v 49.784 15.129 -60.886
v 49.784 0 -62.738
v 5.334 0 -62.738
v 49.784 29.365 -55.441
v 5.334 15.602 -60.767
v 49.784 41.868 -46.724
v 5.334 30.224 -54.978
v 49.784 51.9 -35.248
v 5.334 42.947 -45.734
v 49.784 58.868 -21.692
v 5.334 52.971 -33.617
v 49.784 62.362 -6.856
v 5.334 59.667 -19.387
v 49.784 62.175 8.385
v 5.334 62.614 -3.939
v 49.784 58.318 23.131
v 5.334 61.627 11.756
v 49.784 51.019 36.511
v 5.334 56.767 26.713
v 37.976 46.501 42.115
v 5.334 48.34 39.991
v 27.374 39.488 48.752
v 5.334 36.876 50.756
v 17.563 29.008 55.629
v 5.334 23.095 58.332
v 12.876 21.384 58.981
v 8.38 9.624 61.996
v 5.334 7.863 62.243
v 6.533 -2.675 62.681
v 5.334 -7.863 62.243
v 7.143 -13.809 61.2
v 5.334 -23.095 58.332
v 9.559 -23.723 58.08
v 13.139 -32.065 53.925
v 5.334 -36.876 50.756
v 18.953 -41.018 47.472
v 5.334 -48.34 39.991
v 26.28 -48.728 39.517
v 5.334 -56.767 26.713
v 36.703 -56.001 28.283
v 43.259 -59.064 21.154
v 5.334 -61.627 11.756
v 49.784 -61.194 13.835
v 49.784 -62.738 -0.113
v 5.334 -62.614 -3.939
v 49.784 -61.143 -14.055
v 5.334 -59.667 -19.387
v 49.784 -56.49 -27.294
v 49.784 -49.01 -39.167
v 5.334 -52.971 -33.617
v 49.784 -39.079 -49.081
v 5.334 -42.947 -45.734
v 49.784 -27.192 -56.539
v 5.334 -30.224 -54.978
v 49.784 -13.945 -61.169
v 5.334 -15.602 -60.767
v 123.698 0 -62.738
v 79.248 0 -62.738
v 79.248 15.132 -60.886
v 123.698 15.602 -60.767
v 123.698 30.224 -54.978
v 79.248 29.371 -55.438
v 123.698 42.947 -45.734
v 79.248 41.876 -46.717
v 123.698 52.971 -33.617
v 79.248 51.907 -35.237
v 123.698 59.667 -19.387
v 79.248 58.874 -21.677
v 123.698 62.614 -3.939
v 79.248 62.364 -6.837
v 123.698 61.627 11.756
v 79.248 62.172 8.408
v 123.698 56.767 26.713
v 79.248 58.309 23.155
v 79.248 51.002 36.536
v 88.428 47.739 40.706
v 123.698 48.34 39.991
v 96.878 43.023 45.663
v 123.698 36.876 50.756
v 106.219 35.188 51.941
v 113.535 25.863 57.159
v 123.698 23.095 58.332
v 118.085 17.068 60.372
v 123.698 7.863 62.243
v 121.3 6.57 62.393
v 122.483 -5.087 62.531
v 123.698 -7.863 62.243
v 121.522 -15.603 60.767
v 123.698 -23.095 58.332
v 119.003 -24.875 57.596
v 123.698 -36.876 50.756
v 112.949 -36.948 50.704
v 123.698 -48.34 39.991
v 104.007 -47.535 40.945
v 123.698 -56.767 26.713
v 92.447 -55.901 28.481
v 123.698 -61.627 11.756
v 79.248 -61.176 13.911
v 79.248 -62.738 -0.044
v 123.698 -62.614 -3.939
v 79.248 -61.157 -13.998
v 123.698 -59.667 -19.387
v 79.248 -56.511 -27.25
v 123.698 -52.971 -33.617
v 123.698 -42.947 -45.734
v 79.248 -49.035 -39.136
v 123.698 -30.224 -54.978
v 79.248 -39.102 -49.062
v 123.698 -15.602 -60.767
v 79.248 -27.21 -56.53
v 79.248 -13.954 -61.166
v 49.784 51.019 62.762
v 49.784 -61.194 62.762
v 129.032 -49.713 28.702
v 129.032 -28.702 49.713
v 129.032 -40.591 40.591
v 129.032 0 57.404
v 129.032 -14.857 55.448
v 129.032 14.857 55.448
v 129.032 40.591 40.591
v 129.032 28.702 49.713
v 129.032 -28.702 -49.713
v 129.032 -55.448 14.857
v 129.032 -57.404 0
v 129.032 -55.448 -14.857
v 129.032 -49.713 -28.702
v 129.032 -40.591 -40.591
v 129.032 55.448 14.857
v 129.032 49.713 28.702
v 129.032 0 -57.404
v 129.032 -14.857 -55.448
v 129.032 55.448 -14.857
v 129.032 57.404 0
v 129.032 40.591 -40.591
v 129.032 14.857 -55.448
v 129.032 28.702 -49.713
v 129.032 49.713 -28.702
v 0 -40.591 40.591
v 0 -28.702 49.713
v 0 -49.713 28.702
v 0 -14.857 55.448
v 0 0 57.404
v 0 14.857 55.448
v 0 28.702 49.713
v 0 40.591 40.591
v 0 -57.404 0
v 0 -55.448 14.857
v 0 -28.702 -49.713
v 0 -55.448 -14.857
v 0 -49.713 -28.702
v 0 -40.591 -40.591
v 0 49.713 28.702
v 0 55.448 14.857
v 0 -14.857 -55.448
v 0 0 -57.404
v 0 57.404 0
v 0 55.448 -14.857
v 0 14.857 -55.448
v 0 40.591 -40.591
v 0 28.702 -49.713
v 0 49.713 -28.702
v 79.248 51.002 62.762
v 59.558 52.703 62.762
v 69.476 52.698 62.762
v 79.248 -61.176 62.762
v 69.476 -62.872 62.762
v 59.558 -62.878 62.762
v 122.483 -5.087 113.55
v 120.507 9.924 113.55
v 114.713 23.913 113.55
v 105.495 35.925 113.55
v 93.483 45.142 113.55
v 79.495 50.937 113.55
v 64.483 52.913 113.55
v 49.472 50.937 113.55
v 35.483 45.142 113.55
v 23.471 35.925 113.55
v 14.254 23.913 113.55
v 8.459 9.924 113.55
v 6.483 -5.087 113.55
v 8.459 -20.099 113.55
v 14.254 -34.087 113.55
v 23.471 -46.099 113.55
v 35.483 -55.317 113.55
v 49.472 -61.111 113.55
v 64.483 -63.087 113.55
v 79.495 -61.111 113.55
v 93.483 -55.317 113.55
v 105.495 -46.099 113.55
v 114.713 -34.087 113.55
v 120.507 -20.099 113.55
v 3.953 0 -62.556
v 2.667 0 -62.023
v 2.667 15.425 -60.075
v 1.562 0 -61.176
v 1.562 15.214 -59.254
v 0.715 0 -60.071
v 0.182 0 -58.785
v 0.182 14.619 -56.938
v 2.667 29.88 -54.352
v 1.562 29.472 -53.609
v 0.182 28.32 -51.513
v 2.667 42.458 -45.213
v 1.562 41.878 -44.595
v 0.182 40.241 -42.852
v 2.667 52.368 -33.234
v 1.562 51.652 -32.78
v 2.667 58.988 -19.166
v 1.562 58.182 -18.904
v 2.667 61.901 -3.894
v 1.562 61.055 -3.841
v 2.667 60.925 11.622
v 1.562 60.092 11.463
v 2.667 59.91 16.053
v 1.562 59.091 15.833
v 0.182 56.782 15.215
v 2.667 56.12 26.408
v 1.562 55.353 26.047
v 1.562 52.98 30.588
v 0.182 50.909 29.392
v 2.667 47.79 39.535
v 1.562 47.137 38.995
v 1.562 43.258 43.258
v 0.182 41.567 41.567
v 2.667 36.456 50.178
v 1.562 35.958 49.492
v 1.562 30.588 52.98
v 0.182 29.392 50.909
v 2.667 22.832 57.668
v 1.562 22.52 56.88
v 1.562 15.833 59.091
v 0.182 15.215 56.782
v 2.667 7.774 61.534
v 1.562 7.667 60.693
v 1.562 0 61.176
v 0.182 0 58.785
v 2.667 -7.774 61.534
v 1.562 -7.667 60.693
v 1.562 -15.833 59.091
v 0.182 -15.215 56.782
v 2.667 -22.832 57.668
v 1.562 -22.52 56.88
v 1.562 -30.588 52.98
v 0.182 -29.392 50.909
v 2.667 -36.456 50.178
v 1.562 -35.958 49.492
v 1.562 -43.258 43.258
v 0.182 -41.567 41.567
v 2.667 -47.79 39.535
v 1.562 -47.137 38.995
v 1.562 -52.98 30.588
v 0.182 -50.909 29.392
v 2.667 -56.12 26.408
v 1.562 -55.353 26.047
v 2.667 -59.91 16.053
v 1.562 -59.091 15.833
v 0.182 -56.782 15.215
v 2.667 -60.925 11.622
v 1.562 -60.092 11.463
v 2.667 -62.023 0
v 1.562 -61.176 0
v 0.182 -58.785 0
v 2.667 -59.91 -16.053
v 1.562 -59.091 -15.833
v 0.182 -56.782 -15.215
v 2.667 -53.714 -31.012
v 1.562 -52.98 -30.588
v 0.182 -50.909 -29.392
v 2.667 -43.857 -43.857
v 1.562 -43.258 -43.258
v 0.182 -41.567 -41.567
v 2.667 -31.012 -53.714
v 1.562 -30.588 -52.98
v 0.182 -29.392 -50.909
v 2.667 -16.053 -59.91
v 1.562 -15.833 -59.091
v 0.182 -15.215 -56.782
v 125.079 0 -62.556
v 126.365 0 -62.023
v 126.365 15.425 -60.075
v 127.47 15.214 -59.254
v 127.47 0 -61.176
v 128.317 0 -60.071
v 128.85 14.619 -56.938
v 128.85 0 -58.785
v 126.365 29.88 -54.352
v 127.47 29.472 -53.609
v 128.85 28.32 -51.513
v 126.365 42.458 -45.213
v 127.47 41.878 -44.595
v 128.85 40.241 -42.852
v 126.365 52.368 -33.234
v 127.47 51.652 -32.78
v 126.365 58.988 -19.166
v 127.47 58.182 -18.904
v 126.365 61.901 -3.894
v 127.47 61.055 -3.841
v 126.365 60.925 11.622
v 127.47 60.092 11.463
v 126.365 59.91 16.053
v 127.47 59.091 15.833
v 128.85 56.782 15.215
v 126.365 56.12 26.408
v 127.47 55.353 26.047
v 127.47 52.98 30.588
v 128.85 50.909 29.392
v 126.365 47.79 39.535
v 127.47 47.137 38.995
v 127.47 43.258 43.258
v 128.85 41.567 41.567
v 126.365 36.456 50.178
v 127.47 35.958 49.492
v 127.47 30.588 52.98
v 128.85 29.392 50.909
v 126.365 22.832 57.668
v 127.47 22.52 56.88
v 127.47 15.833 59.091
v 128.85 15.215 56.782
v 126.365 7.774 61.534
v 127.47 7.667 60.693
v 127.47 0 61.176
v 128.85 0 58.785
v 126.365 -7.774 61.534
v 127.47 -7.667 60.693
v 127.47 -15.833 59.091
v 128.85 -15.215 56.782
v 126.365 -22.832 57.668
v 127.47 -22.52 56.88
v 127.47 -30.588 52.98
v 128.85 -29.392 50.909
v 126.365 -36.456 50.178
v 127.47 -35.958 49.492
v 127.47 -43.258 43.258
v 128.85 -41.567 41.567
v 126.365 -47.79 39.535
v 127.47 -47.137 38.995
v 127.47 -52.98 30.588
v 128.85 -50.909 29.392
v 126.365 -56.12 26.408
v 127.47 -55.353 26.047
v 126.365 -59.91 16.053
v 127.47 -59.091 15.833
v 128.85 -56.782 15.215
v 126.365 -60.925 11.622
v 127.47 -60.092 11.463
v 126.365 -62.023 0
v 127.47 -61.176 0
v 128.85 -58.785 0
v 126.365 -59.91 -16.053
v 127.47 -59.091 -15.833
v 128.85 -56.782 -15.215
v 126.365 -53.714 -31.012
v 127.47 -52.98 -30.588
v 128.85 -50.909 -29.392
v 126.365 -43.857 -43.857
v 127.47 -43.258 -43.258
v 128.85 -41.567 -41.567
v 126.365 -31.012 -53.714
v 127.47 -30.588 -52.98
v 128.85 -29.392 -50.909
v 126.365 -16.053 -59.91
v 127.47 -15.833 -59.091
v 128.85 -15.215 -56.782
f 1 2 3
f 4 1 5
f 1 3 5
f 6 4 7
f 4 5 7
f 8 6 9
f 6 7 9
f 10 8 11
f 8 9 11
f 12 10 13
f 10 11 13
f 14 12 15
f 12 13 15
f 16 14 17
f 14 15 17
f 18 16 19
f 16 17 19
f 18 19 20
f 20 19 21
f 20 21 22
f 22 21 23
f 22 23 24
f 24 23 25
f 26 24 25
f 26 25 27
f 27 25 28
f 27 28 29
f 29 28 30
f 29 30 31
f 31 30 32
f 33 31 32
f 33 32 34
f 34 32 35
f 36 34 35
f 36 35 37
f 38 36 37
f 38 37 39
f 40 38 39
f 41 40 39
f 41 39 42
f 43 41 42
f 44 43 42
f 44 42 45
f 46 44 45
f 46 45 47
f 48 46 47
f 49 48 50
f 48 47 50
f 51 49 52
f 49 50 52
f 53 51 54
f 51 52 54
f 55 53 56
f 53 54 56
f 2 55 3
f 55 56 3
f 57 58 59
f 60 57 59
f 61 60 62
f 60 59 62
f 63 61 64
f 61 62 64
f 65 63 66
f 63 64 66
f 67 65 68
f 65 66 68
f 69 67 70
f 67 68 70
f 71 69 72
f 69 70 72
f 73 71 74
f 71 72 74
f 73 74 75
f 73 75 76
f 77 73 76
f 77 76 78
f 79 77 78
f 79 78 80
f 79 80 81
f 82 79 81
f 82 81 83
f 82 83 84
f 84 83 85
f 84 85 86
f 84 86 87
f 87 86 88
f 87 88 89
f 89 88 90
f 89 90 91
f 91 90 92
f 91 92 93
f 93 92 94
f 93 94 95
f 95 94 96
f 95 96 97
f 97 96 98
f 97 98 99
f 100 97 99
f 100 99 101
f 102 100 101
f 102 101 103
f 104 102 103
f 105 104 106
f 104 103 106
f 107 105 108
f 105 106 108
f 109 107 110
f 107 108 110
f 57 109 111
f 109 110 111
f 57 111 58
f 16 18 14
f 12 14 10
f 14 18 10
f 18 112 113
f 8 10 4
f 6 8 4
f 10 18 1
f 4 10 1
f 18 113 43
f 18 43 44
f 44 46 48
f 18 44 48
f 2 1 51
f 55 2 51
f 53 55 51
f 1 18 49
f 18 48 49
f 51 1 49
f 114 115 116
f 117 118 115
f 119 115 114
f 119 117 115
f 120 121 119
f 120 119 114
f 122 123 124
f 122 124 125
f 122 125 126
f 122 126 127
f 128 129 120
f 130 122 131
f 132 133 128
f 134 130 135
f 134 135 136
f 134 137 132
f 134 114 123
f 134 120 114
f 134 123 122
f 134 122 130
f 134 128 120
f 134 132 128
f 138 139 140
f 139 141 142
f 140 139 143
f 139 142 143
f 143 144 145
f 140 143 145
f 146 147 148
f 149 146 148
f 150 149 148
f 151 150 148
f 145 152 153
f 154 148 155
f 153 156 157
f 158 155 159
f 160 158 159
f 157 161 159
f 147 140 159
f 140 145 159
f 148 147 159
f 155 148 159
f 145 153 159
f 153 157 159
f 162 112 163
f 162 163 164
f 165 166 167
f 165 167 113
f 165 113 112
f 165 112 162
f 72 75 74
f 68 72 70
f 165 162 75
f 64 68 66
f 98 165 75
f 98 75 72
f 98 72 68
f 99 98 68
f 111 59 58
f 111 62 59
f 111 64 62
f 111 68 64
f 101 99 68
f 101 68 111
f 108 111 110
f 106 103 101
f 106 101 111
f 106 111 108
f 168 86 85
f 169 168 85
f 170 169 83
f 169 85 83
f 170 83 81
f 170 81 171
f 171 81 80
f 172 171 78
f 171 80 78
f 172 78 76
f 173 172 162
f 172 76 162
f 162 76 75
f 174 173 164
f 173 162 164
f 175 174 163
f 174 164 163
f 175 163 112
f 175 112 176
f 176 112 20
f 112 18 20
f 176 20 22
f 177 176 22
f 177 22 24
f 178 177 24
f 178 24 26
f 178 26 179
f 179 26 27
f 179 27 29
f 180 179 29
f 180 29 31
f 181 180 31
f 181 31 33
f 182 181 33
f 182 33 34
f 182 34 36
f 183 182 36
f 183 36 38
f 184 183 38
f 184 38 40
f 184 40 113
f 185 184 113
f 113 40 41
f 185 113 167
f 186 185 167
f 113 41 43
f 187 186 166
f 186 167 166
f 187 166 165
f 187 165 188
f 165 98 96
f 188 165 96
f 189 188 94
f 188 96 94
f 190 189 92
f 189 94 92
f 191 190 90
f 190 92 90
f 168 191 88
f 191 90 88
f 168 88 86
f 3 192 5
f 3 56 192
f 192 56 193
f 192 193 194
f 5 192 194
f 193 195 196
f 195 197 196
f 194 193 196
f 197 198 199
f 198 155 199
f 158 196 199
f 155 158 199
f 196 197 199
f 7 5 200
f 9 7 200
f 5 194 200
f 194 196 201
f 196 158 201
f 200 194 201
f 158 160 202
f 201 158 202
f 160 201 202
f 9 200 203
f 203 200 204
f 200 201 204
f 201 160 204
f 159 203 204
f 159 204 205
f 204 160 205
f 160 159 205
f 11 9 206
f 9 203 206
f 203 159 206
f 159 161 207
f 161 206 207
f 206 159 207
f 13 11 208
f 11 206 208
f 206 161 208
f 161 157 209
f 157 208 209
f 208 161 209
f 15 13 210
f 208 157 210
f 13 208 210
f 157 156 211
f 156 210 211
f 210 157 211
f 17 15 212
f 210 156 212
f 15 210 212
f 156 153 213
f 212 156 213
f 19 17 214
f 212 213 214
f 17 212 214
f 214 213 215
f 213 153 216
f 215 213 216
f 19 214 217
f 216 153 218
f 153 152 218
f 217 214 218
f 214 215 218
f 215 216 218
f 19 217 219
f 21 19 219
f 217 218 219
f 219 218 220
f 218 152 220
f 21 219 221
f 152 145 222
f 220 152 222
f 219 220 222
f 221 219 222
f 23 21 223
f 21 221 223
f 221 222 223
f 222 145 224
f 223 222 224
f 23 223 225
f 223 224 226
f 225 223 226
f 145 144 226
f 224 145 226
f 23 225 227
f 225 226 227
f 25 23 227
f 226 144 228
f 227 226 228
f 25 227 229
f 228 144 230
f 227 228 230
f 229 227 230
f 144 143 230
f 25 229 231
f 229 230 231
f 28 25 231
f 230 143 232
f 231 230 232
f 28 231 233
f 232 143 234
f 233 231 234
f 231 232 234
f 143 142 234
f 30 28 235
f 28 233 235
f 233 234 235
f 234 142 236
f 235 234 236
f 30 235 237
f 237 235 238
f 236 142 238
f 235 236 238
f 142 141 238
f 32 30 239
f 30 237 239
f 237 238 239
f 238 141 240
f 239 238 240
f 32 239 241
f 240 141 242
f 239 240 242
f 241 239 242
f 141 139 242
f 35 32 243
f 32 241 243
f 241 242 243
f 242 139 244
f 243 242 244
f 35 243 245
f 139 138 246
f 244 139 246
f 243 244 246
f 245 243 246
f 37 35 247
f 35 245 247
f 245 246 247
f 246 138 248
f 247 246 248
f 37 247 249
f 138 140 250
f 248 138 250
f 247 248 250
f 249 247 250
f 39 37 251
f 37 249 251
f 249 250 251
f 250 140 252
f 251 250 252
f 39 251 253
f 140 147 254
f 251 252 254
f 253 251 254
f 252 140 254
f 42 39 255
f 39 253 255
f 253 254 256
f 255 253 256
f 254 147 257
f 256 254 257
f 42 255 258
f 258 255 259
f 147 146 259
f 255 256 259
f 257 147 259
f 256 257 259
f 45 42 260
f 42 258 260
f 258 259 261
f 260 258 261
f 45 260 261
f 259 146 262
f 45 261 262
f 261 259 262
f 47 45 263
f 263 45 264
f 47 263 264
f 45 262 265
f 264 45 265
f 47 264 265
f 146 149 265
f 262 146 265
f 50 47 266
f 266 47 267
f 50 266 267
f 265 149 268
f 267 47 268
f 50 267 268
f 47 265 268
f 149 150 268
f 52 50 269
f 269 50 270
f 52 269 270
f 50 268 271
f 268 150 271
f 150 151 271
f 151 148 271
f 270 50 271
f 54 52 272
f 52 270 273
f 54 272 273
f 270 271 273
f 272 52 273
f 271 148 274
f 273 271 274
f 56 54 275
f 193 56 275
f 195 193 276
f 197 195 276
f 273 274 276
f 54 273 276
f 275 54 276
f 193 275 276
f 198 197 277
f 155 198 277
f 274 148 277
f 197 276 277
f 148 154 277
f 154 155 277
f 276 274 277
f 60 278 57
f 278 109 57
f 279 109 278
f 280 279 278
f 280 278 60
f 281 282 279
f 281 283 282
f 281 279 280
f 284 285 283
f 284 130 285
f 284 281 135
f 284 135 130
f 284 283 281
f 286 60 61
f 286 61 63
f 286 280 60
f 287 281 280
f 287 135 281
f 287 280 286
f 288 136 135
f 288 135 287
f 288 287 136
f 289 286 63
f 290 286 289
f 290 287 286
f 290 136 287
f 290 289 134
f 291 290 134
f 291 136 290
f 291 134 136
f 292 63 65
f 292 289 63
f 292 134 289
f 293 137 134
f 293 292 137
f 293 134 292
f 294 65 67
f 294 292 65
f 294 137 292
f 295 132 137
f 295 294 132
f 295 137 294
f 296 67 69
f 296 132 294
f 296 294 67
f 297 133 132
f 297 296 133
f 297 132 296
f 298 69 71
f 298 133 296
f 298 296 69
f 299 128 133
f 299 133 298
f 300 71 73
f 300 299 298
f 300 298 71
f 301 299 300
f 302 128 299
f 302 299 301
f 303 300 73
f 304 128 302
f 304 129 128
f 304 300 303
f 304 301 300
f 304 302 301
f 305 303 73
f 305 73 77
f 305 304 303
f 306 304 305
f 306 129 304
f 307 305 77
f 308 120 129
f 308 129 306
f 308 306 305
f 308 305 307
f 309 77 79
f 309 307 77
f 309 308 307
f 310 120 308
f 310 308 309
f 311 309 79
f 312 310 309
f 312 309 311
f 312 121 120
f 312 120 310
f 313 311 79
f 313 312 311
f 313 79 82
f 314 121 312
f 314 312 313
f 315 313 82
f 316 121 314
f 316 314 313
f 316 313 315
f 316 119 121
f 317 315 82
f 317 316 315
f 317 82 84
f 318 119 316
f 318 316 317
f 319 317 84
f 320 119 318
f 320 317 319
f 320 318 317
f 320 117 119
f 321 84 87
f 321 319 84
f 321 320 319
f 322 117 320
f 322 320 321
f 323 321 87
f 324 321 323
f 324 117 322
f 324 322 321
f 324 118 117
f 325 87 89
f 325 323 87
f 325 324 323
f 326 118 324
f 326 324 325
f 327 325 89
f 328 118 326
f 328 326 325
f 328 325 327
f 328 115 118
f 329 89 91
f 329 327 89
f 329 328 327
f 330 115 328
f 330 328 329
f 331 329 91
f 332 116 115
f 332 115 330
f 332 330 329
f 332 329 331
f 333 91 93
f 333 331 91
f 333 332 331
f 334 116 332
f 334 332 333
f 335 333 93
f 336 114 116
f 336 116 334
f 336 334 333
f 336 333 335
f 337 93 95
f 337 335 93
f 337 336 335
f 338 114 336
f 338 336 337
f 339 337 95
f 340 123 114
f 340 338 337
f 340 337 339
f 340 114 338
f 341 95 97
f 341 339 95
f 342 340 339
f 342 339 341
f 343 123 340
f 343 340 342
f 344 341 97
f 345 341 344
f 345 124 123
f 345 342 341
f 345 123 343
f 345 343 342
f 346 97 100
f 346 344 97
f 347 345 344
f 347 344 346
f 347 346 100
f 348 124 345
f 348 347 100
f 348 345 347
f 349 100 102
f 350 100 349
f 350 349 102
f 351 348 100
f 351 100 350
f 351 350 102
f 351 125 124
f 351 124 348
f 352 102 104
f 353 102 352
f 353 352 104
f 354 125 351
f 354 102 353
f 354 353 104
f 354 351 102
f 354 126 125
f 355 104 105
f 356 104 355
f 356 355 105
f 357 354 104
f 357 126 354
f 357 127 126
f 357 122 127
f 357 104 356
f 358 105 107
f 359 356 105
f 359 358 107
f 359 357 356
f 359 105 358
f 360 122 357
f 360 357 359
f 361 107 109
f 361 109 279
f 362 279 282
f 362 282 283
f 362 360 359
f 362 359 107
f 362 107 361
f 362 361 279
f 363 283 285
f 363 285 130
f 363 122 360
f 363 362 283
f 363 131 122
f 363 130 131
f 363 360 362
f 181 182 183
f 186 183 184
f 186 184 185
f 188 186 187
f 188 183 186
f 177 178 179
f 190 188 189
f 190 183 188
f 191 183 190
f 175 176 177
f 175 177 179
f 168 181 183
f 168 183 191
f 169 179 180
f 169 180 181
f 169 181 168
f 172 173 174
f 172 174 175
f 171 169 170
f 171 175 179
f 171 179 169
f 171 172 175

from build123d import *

# Parameters (mm, degrees)
SKETCH1_R               = 62.738
BOSS_EXTRUDE1_DEPTH     = 129.032
FILLET1_R               = 5.334
FILLET2_R               = 5.334
CUT_EXTRUDE1_DEPTH      = 157.593008583
CUT_EXTRUDE1_DEPTH_BACK = 157.593008583
SKETCH2_W               = 29.464
SKETCH2_H               = 125.476
BOSS_EXTRUDE2_START     = 10.518
BOSS_EXTRUDE2_OUTLINE_R = 58
BOSS_EXTRUDE2_DEPTH     = 103.032
CUT_EXTRUDE2_DEPTH      = 184.092449966
CUT_EXTRUDE2_DEPTH_BACK = 184.092449966
SKETCH3_W               = 29.464
SKETCH3_H               = 125.5


# Read off the part's stored shape, not the designer's step: Boss-Extrude2
with BuildPart() as part:
    # Sketch1 → Boss-Extrude1 (new body)
    with BuildSketch(Plane(origin=(0, 0, 0), x_dir=(0, 0, -1), z_dir=(1, 0, 0))):
        Circle(SKETCH1_R)
    extrude(amount=BOSS_EXTRUDE1_DEPTH)

    # Fillet1
    fillet1_edges = [part.edges().sort_by_distance(p)[0] for p in [
        (0, 0, 62.738),
    ]]
    fillet(fillet1_edges, radius=FILLET1_R)

    # Fillet2
    fillet2_edges = [part.edges().sort_by_distance(p)[0] for p in [
        (129.032, 0, 62.738),
    ]]
    fillet(fillet2_edges, radius=FILLET2_R)

    # Sketch2 → Cut-Extrude1 (cut, two sides: drawn at the far end of the back side and taken through both)
    with BuildSketch(Plane.XY.offset(-CUT_EXTRUDE1_DEPTH_BACK)):
        with Locations((64.516, 0)):
            Rectangle(SKETCH2_W, SKETCH2_H)
    extrude(amount=CUT_EXTRUDE1_DEPTH + CUT_EXTRUDE1_DEPTH_BACK, mode=Mode.SUBTRACT)


with BuildPart() as cut_extrude1_piece_1:
    # of the separate pieces the step leaves, piece 1, a body of its own (cut_extrude1_pieces)
    add(part.part.solids().sort_by_distance((5.334, 0, -62.738))[0])



with BuildPart() as cut_extrude1_piece_2:
    # of the separate pieces the step leaves, piece 2, a body of its own (cut_extrude1_pieces)
    add(part.part.solids().sort_by_distance((79.248, 0, -62.738))[0])


with BuildPart() as cut_extrude1_piece_1_1:
    add(cut_extrude1_piece_1.part)

    add(cut_extrude1_piece_2.part)  # Boss-Extrude2 merges Cut-Extrude1 piece 2
    # Boss-Extrude2 outline → Boss-Extrude2 (add)
    with BuildSketch(Plane.XY.offset(BOSS_EXTRUDE2_START)):
        with Locations((64.483080673, -5.087127651)):
            Circle(BOSS_EXTRUDE2_OUTLINE_R)
    extrude(amount=BOSS_EXTRUDE2_DEPTH)

    # Sketch3 → Cut-Extrude2 (cut, two sides: drawn at the far end of the back side and taken through both)
    with BuildSketch(Plane(origin=(0, 0, 0), x_dir=(1, 0, 0), z_dir=(0, 1, 0)).offset(-CUT_EXTRUDE2_DEPTH_BACK)):
        with Locations((64.516, -0.012)):
            Rectangle(SKETCH3_W, SKETCH3_H)
    extrude(amount=CUT_EXTRUDE2_DEPTH + CUT_EXTRUDE2_DEPTH_BACK, mode=Mode.SUBTRACT)


solid = cut_extrude1_piece_1_1.part
